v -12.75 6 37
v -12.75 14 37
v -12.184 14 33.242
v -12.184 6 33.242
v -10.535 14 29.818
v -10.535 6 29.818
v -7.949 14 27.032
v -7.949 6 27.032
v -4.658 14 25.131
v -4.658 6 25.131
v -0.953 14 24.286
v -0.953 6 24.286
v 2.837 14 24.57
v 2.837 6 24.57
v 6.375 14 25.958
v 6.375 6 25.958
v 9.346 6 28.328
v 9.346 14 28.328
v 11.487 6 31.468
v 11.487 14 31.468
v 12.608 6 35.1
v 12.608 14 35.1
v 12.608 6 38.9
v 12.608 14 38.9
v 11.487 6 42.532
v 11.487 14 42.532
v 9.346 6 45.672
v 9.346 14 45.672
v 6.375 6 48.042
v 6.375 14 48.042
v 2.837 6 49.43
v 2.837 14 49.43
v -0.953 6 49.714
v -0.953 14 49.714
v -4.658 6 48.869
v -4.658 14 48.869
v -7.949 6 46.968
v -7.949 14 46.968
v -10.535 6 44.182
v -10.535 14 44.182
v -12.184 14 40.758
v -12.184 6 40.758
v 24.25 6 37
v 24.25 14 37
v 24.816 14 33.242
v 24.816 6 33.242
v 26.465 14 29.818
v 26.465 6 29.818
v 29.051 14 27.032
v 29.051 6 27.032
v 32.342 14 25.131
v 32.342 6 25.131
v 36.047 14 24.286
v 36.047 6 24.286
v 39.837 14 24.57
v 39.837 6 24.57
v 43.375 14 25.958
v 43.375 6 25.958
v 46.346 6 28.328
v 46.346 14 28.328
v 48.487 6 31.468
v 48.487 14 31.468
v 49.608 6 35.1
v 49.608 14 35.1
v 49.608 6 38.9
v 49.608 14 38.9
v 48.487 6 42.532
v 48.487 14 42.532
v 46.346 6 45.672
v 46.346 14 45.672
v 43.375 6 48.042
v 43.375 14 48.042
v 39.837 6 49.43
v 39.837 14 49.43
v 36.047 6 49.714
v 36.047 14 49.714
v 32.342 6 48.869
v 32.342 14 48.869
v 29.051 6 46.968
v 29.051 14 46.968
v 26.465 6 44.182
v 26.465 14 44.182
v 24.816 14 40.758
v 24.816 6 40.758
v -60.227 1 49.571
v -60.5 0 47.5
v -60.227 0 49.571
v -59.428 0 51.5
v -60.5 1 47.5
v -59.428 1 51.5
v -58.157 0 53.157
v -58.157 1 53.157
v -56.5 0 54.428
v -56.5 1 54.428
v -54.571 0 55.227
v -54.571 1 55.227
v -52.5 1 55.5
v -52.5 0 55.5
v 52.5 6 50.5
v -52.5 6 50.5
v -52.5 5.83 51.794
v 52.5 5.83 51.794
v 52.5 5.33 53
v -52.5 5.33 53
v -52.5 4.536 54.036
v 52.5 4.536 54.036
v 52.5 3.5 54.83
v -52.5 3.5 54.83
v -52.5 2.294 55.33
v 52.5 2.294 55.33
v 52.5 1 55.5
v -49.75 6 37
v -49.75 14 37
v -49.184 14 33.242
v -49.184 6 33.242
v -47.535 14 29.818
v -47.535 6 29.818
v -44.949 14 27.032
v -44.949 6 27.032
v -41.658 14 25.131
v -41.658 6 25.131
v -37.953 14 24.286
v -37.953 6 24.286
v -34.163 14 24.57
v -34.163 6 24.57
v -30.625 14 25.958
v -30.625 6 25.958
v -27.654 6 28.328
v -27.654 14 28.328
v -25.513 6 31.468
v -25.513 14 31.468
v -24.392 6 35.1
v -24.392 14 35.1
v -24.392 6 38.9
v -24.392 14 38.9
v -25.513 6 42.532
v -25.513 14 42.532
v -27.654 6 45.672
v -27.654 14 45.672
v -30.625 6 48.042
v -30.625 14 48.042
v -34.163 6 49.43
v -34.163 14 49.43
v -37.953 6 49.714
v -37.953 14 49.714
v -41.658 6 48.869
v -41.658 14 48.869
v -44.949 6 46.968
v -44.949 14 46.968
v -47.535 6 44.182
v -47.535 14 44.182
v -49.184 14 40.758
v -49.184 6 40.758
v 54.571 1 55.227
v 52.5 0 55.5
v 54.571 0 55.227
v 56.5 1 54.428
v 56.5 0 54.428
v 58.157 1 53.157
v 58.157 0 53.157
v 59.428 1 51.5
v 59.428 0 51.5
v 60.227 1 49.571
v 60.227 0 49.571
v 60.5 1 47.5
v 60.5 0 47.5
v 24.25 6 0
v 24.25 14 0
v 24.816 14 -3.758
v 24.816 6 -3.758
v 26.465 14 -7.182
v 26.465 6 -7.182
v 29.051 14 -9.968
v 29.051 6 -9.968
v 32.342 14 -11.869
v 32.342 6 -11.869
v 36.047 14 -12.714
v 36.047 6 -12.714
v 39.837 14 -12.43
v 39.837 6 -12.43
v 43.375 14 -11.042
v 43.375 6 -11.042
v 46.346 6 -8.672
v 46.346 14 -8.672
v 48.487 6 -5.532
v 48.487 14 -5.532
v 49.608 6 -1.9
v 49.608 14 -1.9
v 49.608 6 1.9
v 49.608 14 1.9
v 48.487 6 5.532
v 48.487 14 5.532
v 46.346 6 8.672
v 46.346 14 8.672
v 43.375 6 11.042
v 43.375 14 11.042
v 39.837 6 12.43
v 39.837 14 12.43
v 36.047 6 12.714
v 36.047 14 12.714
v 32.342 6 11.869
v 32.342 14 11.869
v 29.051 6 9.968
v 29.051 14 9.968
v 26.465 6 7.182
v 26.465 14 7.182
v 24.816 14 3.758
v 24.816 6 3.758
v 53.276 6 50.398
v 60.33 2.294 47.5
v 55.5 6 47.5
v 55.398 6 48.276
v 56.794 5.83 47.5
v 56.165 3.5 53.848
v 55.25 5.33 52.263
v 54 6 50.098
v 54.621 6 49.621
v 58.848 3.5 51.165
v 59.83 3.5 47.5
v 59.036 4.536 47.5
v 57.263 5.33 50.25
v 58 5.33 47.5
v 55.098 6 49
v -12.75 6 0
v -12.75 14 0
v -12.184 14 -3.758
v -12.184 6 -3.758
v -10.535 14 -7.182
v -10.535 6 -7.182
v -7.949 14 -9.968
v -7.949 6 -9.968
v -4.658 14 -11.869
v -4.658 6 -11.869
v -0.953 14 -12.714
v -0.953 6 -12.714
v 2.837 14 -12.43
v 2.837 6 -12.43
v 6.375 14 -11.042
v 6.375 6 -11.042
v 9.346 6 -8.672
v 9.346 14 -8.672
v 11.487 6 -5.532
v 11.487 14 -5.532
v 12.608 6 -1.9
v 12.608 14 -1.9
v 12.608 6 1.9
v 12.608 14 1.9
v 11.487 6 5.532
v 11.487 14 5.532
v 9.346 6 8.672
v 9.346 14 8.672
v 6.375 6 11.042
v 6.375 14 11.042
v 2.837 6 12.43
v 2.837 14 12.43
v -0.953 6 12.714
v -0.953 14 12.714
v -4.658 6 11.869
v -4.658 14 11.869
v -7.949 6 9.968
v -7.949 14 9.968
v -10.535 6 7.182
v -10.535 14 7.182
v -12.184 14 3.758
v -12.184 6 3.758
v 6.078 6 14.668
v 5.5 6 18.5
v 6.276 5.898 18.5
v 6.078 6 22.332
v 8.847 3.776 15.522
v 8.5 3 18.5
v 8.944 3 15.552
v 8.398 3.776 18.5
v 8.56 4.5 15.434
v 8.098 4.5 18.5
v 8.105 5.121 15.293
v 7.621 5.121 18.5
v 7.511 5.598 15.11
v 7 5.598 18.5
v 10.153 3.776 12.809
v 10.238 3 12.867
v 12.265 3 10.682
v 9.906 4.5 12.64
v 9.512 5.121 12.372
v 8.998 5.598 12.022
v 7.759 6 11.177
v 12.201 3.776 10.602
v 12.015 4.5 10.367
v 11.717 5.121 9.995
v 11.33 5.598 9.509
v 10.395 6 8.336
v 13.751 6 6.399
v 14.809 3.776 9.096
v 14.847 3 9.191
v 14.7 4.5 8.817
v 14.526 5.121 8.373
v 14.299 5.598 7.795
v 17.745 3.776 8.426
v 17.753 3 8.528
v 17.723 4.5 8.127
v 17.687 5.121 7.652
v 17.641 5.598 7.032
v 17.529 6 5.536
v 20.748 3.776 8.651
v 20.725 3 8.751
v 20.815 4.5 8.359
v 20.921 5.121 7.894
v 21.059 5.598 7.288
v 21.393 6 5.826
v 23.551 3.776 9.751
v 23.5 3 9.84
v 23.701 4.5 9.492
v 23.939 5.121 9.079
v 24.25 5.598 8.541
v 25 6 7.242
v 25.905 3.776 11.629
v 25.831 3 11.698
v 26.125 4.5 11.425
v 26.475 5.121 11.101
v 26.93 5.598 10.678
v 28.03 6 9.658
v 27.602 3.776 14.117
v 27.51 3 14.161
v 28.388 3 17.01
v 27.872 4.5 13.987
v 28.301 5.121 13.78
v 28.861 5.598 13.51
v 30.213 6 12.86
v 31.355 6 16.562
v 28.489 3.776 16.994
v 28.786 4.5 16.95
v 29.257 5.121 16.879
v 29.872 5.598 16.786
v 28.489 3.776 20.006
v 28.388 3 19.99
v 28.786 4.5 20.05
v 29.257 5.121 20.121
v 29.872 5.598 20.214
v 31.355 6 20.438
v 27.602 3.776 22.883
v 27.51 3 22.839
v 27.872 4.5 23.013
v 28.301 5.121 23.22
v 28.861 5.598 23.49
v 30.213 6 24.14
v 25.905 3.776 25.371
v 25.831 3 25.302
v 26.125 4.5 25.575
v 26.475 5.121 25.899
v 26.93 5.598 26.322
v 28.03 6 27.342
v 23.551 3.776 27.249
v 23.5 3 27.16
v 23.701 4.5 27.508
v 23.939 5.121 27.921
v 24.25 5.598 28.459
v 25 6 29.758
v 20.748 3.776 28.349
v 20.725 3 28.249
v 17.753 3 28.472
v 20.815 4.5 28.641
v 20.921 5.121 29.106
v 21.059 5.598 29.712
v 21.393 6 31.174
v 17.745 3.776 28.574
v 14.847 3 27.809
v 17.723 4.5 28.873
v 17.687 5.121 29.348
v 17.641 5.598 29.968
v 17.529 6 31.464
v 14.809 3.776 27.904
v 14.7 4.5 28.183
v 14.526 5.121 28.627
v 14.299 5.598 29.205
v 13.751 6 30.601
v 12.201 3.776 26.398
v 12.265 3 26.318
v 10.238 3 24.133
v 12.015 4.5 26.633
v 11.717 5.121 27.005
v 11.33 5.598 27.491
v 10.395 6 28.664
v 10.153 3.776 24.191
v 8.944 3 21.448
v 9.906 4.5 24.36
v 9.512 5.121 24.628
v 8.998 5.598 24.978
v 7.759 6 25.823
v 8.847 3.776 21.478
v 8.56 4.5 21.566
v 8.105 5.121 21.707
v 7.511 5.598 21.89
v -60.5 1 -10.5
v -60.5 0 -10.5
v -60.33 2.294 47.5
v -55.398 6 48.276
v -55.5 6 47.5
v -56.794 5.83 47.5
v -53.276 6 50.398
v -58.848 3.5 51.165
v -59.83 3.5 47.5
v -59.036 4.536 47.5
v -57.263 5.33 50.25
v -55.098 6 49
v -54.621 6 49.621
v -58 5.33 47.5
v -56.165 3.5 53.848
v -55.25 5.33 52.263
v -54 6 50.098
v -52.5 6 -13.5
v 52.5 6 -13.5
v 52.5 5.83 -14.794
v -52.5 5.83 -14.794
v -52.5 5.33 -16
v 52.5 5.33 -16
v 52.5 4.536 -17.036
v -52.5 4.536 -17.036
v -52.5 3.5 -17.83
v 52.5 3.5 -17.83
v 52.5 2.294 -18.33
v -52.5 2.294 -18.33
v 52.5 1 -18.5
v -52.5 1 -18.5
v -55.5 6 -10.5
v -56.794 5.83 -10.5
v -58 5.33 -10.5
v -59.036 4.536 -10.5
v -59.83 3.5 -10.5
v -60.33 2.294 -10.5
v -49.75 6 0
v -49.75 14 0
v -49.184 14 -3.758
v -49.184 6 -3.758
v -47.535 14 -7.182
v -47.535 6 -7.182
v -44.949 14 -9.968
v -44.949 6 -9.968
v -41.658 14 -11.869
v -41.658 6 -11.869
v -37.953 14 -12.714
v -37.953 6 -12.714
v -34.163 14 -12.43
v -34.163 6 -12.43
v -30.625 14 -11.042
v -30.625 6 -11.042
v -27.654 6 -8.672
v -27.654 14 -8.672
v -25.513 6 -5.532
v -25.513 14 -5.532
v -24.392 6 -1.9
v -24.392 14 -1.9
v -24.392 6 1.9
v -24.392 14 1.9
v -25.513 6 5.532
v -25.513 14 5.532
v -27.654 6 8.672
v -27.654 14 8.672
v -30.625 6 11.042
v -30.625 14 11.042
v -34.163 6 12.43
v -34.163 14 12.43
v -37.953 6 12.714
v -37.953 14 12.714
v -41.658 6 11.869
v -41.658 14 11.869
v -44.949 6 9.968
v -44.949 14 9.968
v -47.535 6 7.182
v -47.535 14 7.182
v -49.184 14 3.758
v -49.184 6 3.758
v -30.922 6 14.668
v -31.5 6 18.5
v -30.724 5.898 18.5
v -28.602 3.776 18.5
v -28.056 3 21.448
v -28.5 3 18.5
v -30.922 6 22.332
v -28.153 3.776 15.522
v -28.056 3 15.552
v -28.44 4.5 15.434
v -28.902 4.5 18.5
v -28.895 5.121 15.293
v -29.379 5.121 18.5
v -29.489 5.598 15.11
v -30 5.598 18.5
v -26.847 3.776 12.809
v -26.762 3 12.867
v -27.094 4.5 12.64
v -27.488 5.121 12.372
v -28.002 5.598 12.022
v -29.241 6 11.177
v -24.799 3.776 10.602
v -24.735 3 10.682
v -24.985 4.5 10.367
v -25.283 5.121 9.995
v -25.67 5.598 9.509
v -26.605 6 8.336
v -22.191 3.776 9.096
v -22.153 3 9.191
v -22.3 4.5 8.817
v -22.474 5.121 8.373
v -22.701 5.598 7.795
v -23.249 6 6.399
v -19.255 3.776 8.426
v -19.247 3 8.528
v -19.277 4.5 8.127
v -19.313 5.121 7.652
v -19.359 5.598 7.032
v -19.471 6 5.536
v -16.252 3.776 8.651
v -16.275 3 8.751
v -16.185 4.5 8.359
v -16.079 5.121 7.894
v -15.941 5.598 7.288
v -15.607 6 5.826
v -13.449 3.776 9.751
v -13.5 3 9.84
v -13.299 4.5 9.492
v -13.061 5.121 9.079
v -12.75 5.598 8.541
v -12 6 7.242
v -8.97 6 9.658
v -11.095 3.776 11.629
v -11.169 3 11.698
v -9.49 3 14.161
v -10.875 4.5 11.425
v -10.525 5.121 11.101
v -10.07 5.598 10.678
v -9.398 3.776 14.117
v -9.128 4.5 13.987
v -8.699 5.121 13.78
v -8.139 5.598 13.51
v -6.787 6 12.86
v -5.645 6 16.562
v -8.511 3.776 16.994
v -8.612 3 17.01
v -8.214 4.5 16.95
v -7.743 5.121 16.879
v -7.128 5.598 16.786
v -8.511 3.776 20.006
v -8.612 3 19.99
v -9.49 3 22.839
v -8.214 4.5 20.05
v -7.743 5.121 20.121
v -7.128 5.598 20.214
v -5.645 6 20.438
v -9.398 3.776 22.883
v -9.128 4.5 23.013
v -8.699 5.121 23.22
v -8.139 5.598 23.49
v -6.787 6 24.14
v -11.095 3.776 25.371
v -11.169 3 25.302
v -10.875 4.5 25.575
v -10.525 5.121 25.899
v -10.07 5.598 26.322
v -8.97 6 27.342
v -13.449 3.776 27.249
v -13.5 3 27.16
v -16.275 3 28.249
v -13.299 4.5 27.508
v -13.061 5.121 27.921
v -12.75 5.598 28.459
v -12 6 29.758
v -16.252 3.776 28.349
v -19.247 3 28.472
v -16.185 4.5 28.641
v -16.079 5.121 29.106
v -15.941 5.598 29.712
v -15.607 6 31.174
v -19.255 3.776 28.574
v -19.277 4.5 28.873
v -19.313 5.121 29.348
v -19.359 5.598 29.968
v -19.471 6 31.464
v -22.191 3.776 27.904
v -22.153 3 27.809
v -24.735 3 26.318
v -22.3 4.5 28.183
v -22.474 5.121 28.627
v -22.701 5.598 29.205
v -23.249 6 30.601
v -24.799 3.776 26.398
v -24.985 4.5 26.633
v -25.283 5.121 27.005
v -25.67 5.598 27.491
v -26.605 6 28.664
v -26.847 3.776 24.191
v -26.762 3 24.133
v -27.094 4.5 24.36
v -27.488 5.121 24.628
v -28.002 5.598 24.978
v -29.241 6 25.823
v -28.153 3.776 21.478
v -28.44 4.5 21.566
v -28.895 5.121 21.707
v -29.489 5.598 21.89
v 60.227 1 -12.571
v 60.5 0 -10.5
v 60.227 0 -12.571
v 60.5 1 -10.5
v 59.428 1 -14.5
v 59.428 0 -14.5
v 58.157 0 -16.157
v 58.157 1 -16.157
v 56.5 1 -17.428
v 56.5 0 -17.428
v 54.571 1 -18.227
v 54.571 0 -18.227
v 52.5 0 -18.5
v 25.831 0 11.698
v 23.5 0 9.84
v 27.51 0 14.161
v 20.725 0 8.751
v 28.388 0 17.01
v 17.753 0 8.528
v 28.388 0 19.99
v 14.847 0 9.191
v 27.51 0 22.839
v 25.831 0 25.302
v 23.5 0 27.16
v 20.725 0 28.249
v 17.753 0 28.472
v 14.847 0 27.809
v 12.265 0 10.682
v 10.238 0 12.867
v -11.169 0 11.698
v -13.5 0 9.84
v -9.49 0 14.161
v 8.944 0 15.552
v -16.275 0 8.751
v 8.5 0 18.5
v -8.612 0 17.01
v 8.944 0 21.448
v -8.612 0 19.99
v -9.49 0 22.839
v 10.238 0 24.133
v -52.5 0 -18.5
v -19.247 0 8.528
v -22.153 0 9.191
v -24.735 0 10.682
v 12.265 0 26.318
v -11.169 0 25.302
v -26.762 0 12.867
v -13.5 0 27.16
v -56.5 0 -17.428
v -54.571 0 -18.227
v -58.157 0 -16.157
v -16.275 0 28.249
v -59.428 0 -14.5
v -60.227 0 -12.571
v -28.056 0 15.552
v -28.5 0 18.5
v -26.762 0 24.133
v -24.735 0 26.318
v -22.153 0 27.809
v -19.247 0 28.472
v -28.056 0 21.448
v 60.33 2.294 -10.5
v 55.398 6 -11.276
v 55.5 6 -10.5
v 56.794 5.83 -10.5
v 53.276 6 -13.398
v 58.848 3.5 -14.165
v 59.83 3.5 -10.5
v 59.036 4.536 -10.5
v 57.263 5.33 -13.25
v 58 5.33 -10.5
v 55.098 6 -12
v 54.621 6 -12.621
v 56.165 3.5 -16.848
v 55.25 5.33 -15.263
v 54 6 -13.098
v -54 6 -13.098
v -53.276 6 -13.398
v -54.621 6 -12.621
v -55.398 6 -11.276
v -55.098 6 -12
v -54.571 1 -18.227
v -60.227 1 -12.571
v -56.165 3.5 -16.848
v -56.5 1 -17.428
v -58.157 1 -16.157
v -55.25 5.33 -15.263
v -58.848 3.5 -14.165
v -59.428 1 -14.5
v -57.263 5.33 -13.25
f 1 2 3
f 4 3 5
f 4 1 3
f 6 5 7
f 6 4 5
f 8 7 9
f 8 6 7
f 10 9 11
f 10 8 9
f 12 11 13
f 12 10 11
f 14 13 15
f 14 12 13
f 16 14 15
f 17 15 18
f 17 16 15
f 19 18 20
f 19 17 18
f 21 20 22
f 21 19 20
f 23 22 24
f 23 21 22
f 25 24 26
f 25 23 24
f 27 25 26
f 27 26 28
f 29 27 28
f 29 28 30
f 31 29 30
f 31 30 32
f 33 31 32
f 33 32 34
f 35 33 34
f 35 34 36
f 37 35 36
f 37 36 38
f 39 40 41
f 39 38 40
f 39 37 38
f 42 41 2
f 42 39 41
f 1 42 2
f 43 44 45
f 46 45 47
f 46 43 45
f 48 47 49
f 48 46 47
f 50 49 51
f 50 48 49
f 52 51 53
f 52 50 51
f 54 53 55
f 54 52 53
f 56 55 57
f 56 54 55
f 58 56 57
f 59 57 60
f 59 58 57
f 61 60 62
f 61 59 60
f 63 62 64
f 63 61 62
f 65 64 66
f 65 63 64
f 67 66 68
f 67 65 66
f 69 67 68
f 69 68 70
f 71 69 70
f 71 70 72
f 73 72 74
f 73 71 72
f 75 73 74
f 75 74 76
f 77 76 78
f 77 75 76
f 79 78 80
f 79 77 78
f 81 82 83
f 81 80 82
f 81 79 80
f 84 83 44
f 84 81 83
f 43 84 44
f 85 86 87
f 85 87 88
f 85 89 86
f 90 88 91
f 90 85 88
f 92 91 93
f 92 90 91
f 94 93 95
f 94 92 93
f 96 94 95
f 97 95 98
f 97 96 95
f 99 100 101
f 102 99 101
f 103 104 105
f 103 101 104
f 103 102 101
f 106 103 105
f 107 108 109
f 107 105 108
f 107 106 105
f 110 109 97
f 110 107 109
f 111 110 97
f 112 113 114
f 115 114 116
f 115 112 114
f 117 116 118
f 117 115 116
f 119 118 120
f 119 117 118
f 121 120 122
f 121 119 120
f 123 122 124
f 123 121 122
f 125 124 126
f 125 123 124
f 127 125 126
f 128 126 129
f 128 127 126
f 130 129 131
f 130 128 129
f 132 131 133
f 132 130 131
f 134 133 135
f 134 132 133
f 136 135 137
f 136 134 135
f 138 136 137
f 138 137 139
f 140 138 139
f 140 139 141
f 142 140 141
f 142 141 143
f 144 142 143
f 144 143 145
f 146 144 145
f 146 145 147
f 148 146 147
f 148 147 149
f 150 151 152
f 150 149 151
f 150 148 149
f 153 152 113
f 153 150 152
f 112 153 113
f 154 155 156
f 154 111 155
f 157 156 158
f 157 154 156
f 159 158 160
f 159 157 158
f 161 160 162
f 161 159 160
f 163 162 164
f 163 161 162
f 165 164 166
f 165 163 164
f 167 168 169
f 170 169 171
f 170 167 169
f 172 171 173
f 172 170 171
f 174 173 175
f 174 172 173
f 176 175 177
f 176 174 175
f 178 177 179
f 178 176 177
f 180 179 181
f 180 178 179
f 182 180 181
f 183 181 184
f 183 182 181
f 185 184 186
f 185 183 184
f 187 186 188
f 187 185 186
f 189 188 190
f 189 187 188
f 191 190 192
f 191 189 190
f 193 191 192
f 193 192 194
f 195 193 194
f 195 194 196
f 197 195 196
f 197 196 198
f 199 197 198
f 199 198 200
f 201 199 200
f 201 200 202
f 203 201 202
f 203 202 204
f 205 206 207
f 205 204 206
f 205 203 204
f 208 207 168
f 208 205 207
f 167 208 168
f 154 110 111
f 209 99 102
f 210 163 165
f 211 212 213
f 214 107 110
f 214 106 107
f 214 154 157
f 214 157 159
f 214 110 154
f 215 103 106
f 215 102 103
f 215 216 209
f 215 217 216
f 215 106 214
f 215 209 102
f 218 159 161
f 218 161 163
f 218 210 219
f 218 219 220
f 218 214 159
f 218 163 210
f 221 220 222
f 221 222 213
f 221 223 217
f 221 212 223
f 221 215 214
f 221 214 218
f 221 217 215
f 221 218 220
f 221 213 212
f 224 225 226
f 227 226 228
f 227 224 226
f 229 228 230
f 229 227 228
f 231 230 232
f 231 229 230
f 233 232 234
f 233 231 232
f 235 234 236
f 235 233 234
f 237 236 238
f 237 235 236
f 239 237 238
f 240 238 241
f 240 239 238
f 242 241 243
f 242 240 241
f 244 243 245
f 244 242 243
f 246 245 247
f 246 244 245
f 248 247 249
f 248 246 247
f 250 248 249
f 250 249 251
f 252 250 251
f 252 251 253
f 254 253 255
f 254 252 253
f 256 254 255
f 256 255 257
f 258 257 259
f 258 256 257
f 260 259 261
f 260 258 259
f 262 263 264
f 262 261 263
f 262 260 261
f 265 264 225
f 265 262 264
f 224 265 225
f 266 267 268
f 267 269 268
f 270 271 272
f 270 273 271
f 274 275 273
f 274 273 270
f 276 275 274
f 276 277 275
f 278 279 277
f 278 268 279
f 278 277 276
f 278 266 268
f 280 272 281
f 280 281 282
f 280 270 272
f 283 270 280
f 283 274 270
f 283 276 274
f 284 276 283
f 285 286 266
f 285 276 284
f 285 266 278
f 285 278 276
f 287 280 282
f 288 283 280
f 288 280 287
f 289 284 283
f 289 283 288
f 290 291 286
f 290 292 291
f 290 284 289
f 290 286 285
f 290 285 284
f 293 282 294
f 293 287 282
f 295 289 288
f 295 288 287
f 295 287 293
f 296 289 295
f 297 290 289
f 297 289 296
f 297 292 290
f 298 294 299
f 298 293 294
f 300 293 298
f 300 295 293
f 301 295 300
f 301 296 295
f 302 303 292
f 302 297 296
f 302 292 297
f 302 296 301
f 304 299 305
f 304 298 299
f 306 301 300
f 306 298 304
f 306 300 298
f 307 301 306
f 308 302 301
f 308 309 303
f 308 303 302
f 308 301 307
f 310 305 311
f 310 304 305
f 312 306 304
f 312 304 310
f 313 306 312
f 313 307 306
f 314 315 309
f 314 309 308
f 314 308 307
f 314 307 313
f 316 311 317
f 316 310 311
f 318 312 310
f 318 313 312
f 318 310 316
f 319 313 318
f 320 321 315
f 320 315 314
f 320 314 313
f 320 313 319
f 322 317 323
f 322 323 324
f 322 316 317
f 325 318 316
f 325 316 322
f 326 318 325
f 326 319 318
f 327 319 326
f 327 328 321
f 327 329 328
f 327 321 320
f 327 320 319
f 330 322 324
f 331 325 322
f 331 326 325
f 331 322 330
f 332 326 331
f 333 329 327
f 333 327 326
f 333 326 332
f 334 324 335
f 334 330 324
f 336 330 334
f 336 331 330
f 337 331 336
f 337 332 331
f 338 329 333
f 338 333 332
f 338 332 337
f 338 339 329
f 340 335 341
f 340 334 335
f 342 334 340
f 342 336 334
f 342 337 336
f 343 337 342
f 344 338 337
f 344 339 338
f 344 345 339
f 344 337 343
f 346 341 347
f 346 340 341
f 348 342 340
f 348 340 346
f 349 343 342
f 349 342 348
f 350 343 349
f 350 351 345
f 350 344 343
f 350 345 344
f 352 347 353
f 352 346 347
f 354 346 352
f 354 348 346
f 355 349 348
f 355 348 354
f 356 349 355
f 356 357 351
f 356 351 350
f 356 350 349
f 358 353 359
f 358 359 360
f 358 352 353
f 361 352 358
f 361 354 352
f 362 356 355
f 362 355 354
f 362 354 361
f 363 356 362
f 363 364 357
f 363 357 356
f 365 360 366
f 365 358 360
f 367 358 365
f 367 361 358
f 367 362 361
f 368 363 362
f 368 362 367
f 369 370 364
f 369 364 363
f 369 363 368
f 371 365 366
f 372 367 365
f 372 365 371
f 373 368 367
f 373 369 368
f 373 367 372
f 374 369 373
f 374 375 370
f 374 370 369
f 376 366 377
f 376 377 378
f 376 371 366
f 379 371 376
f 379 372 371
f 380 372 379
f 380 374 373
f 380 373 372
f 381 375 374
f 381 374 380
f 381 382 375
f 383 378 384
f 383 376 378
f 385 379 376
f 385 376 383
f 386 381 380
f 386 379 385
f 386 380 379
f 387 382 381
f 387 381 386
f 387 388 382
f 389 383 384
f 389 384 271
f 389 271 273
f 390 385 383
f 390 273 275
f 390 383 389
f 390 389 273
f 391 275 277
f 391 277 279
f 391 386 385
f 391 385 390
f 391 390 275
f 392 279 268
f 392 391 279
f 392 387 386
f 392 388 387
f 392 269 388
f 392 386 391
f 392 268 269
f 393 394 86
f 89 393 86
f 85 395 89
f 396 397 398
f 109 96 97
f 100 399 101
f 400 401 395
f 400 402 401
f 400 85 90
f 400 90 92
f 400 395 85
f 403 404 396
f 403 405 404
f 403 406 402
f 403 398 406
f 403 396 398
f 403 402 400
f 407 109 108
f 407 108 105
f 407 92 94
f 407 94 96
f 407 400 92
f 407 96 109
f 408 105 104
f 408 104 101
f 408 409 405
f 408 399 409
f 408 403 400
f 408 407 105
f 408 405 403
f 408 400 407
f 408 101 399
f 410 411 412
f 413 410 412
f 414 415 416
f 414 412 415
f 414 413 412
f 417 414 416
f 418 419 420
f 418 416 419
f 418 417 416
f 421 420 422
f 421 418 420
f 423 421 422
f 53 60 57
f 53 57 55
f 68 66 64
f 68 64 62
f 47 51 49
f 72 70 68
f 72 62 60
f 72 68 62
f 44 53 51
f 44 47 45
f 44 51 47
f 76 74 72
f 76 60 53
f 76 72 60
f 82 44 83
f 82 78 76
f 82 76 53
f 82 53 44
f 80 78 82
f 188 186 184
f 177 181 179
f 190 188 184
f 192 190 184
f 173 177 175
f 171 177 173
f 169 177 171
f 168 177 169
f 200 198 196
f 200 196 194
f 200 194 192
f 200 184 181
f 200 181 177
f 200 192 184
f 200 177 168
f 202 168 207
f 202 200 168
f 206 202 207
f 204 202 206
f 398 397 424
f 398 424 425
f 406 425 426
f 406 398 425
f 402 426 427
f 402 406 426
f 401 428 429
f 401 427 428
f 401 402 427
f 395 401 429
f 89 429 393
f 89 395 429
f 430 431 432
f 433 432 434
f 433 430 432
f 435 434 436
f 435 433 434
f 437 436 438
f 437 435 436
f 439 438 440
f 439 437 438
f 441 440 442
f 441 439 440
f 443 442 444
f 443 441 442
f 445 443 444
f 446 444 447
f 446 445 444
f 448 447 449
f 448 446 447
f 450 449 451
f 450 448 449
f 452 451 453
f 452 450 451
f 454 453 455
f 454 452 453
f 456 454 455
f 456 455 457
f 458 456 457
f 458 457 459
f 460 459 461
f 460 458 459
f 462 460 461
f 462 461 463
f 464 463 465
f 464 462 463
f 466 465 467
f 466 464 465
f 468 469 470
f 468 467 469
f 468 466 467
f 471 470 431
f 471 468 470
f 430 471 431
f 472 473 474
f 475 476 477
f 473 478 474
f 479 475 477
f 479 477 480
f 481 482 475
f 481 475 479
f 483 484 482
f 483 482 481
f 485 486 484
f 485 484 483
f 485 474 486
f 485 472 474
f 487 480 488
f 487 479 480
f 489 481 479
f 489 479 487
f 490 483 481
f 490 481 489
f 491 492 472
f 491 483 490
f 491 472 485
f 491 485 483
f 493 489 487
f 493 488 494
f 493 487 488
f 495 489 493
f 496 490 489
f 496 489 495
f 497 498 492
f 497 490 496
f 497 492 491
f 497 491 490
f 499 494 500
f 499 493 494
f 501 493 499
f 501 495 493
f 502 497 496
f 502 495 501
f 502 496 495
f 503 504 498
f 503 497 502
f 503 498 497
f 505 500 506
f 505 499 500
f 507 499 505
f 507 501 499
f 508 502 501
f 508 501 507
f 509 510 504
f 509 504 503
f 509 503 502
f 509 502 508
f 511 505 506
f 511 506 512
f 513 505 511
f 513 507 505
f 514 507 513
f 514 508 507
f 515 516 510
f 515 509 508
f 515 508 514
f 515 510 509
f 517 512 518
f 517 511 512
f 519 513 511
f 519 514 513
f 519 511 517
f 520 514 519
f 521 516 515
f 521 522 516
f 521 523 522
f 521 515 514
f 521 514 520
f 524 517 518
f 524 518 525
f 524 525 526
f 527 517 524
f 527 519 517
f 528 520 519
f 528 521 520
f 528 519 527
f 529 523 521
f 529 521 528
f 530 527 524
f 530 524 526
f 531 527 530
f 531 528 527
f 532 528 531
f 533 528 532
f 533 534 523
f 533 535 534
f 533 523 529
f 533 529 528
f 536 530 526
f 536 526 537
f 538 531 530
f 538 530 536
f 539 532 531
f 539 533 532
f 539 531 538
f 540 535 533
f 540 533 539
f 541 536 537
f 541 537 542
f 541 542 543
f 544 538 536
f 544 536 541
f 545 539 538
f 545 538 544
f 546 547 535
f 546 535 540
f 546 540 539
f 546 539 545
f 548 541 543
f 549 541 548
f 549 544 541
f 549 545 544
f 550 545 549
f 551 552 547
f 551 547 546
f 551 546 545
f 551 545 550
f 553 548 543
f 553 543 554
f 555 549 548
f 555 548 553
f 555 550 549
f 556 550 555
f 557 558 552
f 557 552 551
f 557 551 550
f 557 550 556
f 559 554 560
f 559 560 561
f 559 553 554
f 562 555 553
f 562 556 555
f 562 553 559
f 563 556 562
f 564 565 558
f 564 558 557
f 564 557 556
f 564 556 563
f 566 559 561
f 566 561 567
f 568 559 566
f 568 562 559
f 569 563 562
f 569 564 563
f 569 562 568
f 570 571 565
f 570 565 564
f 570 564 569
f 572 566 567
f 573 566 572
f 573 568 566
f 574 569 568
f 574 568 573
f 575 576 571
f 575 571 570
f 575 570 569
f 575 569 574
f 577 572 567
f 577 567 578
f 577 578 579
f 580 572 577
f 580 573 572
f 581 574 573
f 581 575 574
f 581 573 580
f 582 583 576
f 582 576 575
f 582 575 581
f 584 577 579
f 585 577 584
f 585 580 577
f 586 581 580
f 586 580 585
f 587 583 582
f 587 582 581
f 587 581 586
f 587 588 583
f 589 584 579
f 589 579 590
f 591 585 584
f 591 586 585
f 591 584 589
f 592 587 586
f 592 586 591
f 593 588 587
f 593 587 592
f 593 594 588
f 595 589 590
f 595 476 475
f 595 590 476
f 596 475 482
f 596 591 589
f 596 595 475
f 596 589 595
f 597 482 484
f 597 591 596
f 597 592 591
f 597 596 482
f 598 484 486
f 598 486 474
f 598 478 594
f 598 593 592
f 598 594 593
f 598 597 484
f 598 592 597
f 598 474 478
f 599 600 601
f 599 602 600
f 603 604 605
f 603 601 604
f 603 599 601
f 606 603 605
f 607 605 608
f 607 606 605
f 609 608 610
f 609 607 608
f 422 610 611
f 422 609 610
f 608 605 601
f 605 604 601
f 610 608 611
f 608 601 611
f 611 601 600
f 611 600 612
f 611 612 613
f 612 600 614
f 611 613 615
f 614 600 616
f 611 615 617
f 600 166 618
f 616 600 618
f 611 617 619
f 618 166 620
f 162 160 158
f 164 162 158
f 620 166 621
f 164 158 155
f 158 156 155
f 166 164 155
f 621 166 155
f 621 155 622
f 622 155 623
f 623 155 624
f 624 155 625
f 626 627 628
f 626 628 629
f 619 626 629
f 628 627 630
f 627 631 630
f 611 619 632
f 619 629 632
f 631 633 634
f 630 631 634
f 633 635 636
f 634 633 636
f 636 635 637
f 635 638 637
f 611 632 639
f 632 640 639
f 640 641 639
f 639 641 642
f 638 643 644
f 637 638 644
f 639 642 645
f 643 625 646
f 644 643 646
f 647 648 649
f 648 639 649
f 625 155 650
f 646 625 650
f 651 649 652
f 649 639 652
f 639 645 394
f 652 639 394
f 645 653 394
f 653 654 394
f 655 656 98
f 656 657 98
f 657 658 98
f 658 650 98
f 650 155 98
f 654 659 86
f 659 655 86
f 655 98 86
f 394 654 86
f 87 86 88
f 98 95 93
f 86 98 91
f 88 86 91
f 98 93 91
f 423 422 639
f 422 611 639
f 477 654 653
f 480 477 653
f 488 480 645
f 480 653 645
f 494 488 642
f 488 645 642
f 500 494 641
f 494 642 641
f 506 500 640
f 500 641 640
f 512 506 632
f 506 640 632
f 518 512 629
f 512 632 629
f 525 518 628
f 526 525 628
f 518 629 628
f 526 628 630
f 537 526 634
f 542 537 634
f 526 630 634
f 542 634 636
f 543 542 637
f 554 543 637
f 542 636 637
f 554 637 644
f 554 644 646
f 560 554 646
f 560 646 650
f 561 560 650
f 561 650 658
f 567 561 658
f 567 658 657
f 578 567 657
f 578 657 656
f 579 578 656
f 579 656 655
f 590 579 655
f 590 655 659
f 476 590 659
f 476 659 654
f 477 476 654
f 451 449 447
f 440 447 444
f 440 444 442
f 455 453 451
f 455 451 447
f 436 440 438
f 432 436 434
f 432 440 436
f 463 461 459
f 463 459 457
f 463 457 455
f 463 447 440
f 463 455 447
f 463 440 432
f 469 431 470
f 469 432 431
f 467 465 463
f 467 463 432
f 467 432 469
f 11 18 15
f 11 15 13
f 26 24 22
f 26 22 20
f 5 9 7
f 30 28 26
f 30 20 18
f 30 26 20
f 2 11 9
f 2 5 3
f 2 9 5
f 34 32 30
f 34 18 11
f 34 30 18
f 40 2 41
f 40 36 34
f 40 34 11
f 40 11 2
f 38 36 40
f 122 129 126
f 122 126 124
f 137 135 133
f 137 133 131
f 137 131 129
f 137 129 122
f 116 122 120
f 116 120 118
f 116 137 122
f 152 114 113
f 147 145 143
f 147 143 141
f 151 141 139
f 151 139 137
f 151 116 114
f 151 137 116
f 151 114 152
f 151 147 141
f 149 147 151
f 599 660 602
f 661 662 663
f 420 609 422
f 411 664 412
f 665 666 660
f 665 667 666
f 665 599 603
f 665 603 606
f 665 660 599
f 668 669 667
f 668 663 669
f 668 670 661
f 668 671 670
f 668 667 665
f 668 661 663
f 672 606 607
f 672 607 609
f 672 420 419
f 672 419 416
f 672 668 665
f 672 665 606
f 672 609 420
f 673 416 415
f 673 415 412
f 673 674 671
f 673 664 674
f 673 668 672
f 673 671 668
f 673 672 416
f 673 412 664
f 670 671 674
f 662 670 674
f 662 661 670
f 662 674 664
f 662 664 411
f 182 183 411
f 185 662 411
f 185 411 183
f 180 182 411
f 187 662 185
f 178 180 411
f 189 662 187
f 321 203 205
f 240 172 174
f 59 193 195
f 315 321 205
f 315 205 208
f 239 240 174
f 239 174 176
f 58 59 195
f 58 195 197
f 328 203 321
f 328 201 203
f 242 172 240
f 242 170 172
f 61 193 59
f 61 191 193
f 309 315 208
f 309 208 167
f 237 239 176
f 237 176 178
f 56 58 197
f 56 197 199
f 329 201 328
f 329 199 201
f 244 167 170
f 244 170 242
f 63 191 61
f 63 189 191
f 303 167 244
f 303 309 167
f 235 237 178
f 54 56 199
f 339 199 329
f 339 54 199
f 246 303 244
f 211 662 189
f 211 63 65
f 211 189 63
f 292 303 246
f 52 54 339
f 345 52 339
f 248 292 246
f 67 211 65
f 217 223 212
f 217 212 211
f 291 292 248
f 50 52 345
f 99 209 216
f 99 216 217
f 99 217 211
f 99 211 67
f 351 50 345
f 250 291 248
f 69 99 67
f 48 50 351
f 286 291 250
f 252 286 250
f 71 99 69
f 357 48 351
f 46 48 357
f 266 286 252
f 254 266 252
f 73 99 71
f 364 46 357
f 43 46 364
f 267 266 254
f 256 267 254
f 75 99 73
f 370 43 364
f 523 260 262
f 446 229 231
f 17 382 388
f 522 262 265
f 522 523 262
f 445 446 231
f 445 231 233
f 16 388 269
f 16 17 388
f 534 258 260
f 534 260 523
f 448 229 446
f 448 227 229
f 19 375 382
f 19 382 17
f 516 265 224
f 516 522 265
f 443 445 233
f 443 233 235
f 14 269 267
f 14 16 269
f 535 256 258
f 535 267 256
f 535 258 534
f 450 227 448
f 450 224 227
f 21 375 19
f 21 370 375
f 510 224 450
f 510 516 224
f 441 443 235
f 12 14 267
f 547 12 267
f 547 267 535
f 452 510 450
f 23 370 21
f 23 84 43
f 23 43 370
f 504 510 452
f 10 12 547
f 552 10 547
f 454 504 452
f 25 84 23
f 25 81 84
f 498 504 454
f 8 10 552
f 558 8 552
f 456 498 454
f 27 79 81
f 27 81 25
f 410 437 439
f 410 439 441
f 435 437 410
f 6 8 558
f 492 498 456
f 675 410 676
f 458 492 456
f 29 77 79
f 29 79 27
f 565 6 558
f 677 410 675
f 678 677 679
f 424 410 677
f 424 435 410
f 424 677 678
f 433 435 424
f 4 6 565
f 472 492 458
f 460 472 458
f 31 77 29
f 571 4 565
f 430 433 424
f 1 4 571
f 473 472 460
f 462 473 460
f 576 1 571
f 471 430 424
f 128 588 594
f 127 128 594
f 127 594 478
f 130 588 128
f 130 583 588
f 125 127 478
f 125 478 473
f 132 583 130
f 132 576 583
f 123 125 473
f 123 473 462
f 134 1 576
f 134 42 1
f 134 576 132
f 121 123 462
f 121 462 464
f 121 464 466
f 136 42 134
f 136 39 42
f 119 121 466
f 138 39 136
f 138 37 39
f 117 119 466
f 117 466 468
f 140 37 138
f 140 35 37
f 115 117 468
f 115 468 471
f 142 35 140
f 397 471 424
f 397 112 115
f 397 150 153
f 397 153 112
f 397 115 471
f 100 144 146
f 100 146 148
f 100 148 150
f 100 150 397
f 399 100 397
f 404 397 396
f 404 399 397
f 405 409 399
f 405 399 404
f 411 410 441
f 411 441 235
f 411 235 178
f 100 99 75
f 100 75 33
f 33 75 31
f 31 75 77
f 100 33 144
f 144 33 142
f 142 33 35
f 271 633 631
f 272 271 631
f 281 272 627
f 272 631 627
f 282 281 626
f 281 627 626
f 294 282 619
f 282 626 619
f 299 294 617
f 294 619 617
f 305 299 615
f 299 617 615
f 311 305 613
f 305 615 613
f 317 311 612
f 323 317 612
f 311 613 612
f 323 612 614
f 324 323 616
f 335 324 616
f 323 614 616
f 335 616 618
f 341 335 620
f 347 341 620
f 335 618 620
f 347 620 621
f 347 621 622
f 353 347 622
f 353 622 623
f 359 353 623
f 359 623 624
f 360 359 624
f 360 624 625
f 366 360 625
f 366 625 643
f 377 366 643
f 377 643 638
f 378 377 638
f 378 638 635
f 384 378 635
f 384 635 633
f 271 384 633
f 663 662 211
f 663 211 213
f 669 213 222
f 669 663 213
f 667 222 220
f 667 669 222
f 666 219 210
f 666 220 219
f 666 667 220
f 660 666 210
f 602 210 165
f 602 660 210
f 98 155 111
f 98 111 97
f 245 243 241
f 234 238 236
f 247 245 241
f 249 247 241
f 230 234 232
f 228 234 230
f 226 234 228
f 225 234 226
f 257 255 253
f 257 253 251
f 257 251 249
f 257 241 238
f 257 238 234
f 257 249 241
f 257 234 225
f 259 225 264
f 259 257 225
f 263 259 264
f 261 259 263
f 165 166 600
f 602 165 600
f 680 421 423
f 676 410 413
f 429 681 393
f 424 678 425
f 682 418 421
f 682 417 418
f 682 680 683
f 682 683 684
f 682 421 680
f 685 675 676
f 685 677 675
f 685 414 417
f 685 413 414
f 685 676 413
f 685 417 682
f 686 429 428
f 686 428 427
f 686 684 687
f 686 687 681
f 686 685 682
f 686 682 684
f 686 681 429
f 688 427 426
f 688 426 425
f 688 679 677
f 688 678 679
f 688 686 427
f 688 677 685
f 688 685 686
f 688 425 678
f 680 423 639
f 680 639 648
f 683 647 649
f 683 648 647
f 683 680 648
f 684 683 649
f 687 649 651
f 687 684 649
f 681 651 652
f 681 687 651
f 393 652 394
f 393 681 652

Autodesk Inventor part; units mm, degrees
ref_plane "YZ Plane" through (0, 0, 0) normal (1, 0, 0) x (0, 1, 0)
ref_plane "XZ Plane" through (0, 0, 0) normal (0, 1, 0) x (-1, 0, 0)
ref_plane "XY Plane" through (0, 0, 0) normal (0, 0, 1) x (1, 0, 0)
sketch "Sketch1" plane through (0, 0, 0) normal (0, 1, 0) x (-1, 0, 0)
  line L0 (25.9, 0) -> (-25.9, 0) projected
  line L1 (0, -25.9) -> (0, 25.9) projected
  circle A0 centre (0, 0) radius 18.5 construction
  circle A1 centre (0, 0) radius 13 construction
  dimension "d0" = 37
  dimension "d1" = 26
sketch "Sketch2" plane through (0, 0, 0) normal (0, 1, 0) x (-1, 0, 0)
  line L0 (84.7, 0) -> (-84.7, 0) projected
  line L1 (0, -33.3) -> (0, 70.3) projected
  line L2 (-60.5, 55.5) -> (-60.5, -18.5)
  line L3 (-60.5, -18.5) -> (60.5, -18.5)
  line L4 (60.5, -18.5) -> (60.5, 55.5)
  line L5 (-60.5, 55.5) -> (60.5, 55.5)
  circle A0 centre (0, 37) radius 18.5 construction
  point P0 (0, 0)
  dimension "d3" = 121
  dimension "d29" = 18.5
  dimension "d30" = 55.5
  dimension "d99" = 37
  dimension "d100" = 37
extrude "Extrusion1" add sketch "Sketch2" along normal blind 6
sketch "Sketch6" plane through (0, 0, 0) normal (0, 1, 0) x (-1, 0, 0)
  line L0 (60.5, -18.5) -> (-60.5, -18.5) projected
  line L1 (60.5, 55.5) -> (60.5, -18.5) projected
  line L2 (-60.5, -18.5) -> (60.5, -18.5)
  line L3 (60.5, -18.5) -> (60.5, 55.5)
  line L4 (-60.5, 55.5) -> (-60.5, -18.5)
  line L5 (84.7, 0) -> (-84.7, 0) projected
  line L6 (0, -36.3) -> (0, 70.8) projected
  arc A0 (-16, 0) -> (16, 0) centre (0, 0) ccw
  line L7 (16, 0) -> (16, 55.5)
  line L8 (60.5, 55.5) -> (-60.5, 55.5) projected
  line L9 (16, 55.5) -> (60.5, 55.5)
  line L10 (-16, 0) -> (-16, 55.5)
  line L11 (-16, 55.5) -> (-60.5, 55.5)
  point P0 (-17.3617, -21)
  dimension "d18" = 32
extrude "Extrusion5" [suppressed]
sketch "Sketch4" plane through (0, 0, 0) normal (0, 0, 1) x (1, 0, 0)
  line L0 (-18.5, 0) -> (18.5, 0)
  line L1 (18.5, 0) -> (18.5, -2)
  line L2 (18.5, -2) -> (-18.5, -2)
  line L3 (-18.5, -2) -> (-18.5, 0)
  line L4 (-25.9, 0) -> (25.9, 0) projected
  line L5 (0, -2.4) -> (0, 0.4) projected
  point P0 (0, 0)
  dimension "d10" = 37
  dimension "d11" = 2
extrude "Extrusion6" [suppressed]
sketch "Sketch5" plane through (0, 0, 0) normal (0, 1, 0) x (-1, 0, 0)
  circle A0 centre (0, 0) radius 18.5 construction
  circle A1 centre (0, 0) radius 18.5 construction
  line L0 (25.9, 0) -> (-25.9, 0) projected
  line L1 (0, -28.9) -> (0, 26.4) projected
  line L2 (-18.5, -21) -> (18.5, -21)
  line L3 (18.5, -21) -> (18.5, -18.5)
  line L4 (18.5, -18.5) -> (-18.5, -18.5)
  line L5 (-18.5, -18.5) -> (-18.5, -21)
  dimension "d25" = 37
  dimension "d26" = 21
extrude "Extrusion7" [suppressed]
sketch "Sketch7" plane through (0, 0, 0) normal (0, 0, 1) x (1, 0, 0)
  line L0 (-18.5, 0) -> (18.5, 0)
  line L1 (18.5, 0) -> (18.5, -2)
  line L2 (18.5, -2) -> (-18.5, -2)
  line L3 (-18.5, -2) -> (-18.5, 0)
  line L4 (60.5, 0) -> (-60.5, 0) projected
  line L5 (-84.7, 0) -> (84.7, 0) projected
  line L6 (0, -2.4) -> (0, 0.4) projected
  point P0 (-16, 0)
  point P1 (16, 0)
  dimension "d53" = 2
  dimension "d54" = 18.5
extrude "Extrusion8" [suppressed]
sketch "Sketch8" plane through (0, 0, 0) normal (0, 1, 0) x (-1, 0, 0)
  circle A0 centre (0, 0) radius 12.75
  dimension "d34" = 25.5
extrude "Extrusion9" add sketch "Sketch8" along normal blind 14
pattern_linear "Rectangular Pattern1" count 2 spacing 37 along (0, 0, 1) count 3 spacing 37 along (1, 0, 0) of "Extrusion9" second direction both ways yes
sketch "Sketch9" plane through (0, 6, 0) normal (0, 1, 0) x (1, 0, 0)
  circle A0 centre (0, 0) radius 13
  circle A1 centre (0, 0) radius 15
  dimension "d40" = 26
  dimension "d41" = 30
extrude "Extrusion10" [suppressed]
sketch "Sketch10" plane through (0, 5, 0) normal (0, 1, 0) x (1, 0, 0)
  arc A0 (16, 0) -> (-16, 0) centre (0, 0) ccw projected
  line L0 (1.5, -18) -> (-1.5, -18)
  line L1 (-29.4, 0) -> (29.4, 0) projected
  line L2 (0, 36.3) -> (0, -70.8) projected
  line L3 (1.5, -12) -> (-1.5, -12)
  line L4 (1.5, -12) -> (1.5, -18)
  line L5 (-1.5, -18) -> (-1.5, -12)
  dimension "d48" = 3
  dimension "d49" = 12
  dimension "d50" = 6
extrude "Extrusion11" [suppressed]
fillet "Fillet1" [suppressed]
sketch "Sketch11" plane through (0, 0, 0) normal (0, 1, 0) x (-1, 0, 0)
  line L0 (-60.5, -21) -> (60.5, -21)
  line L1 (60.5, -21) -> (60.5, -47)
  line L2 (60.5, -47) -> (-60.5, -47)
  line L3 (-60.5, -47) -> (-60.5, -21)
  line L4 (84.7, 0) -> (-84.7, 0) projected
  line L5 (0, -60.1) -> (0, 31.6) projected
  point P0 (0, 0)
  dimension "d57" = 26
  dimension "d58" = 21
  dimension "d59" = 121
extrude "Extrusion12" [suppressed]
sketch "Sketch12" plane through (0, 0, 0) normal (1, 0, 0) x (0, 1, 0)
  line L0 (6, 55.5) -> (6, -18.5) projected
  arc A0 (6, -16.5081) -> (5.7334, -47) centre (34, -32) ccw
  line L1 (-6.8, 0) -> (40.8, 0) projected
  line L2 (0, -67.5) -> (0, 76) projected
  line L3 (6, -16.5081) -> (6, -47)
  line L4 (6, -47) -> (5.7334, -47)
  line L5 (0, -47) -> (6, -47) projected
  point P0 (0, 0)
  point P1 (6, 48)
  dimension "d62" = 32
  dimension "d63" = 32
  dimension "d64" = 34
extrude "Extrusion13" [suppressed]
fillet "Fillet3" [suppressed]
sketch "Sketch13" plane through (0, 0, 0) normal (0, 1, 0) x (-1, 0, 0)
  line L0 (84.7, 0) -> (-84.7, 0) projected
  line L1 (0, -67.5) -> (0, 76) projected
  line L2 (60.5, 55.5) -> (60.5, -18.5) projected
  arc A0 (13.0815, 23.9185) -> (13.0815, 13.0815) centre (18.5, 18.5) ccw
  line L3 (-60.5, 55.5) -> (-60.5, -18.5) projected
  arc A1 (-13.0815, 13.0815) -> (-13.0815, 23.9185) centre (-18.5, 18.5) ccw
  line L4 (18.5, 37) -> (18.5, 0)
  line L5 (-18.5, 0) -> (-18.5, 37)
  line L6 (18.5, 37) -> (18.5, 55.5)
  line L7 (-60.5, 55.5) -> (60.5, 55.5) projected
  line L8 (-18.5, 55.5) -> (-18.5, 37)
  arc A2 (-9.2871, 53) -> (-13.0815, 23.9185) centre (0, 37) ccw
  arc A3 (13.0815, 23.9185) -> (9.2871, 53) centre (0, 37) ccw
  arc A4 (-13.0815, 13.0815) -> (-18.5, 0) centre (0, 0) ccw
  arc A5 (18.5, 0) -> (13.0815, 13.0815) centre (0, 0) ccw
  point P0 (60.5, -39.254)
  point P1 (-55.5, 48)
  point P2 (-60.5, -16.5081)
  point P3 (-60.5, -47)
  point P4 (60.5, -18.5)
  point P5 (-60.5, -18.5)
  dimension "d68" = 37
  dimension "d71" = 18.5
  dimension "d72" = 18.5
  dimension "d73" = 7.663
  dimension "d74" = 7.663
  dimension "d75" = 18.5
  dimension "d76" = 18.5
  dimension "d77" = 18.5
  dimension "d78" = 18.5
extrude "Extrusion14" [suppressed]
sketch "Sketch14" plane through (0, 0, 0) normal (0, 1, 0) x (-1, 0, 0)
  circle A0 centre (18.5, 18.5) radius 10
  line L0 (39.9, 0) -> (-39.9, 0) projected
  line L1 (0, -27.9) -> (0, 37.9) projected
  circle A1 centre (-18.5, 18.5) radius 10
  point P0 (0, 0)
  dimension "d84" = 18.5
  dimension "d85" = 18.5
  dimension "d86" = 20
  dimension "d89" = 37
extrude "Extrusion15" cut sketch "Sketch14" along normal through all
fillet "Fillet4" radius 3 2 edges at (-8.5, 6, 18.5) (28.5, 6, 18.5)
fillet "Fillet5" radius 8 4 edges at (-60.5, 3, 55.5) (60.5, 3, 55.5) (-60.5, 3, -18.5) (60.5, 3, -18.5)
fillet "Fillet6" radius 5 5 edges at (58.1569, 6, 53.1569) (60.5, 6, 18.5) (-58.1569, 6, 53.1569) (-60.5, 6, 18.5) (0, 6, 55.5)
equation "\"d85\" = d84"
properties part number "NespressoSpeedfiller-6X-tamper"
